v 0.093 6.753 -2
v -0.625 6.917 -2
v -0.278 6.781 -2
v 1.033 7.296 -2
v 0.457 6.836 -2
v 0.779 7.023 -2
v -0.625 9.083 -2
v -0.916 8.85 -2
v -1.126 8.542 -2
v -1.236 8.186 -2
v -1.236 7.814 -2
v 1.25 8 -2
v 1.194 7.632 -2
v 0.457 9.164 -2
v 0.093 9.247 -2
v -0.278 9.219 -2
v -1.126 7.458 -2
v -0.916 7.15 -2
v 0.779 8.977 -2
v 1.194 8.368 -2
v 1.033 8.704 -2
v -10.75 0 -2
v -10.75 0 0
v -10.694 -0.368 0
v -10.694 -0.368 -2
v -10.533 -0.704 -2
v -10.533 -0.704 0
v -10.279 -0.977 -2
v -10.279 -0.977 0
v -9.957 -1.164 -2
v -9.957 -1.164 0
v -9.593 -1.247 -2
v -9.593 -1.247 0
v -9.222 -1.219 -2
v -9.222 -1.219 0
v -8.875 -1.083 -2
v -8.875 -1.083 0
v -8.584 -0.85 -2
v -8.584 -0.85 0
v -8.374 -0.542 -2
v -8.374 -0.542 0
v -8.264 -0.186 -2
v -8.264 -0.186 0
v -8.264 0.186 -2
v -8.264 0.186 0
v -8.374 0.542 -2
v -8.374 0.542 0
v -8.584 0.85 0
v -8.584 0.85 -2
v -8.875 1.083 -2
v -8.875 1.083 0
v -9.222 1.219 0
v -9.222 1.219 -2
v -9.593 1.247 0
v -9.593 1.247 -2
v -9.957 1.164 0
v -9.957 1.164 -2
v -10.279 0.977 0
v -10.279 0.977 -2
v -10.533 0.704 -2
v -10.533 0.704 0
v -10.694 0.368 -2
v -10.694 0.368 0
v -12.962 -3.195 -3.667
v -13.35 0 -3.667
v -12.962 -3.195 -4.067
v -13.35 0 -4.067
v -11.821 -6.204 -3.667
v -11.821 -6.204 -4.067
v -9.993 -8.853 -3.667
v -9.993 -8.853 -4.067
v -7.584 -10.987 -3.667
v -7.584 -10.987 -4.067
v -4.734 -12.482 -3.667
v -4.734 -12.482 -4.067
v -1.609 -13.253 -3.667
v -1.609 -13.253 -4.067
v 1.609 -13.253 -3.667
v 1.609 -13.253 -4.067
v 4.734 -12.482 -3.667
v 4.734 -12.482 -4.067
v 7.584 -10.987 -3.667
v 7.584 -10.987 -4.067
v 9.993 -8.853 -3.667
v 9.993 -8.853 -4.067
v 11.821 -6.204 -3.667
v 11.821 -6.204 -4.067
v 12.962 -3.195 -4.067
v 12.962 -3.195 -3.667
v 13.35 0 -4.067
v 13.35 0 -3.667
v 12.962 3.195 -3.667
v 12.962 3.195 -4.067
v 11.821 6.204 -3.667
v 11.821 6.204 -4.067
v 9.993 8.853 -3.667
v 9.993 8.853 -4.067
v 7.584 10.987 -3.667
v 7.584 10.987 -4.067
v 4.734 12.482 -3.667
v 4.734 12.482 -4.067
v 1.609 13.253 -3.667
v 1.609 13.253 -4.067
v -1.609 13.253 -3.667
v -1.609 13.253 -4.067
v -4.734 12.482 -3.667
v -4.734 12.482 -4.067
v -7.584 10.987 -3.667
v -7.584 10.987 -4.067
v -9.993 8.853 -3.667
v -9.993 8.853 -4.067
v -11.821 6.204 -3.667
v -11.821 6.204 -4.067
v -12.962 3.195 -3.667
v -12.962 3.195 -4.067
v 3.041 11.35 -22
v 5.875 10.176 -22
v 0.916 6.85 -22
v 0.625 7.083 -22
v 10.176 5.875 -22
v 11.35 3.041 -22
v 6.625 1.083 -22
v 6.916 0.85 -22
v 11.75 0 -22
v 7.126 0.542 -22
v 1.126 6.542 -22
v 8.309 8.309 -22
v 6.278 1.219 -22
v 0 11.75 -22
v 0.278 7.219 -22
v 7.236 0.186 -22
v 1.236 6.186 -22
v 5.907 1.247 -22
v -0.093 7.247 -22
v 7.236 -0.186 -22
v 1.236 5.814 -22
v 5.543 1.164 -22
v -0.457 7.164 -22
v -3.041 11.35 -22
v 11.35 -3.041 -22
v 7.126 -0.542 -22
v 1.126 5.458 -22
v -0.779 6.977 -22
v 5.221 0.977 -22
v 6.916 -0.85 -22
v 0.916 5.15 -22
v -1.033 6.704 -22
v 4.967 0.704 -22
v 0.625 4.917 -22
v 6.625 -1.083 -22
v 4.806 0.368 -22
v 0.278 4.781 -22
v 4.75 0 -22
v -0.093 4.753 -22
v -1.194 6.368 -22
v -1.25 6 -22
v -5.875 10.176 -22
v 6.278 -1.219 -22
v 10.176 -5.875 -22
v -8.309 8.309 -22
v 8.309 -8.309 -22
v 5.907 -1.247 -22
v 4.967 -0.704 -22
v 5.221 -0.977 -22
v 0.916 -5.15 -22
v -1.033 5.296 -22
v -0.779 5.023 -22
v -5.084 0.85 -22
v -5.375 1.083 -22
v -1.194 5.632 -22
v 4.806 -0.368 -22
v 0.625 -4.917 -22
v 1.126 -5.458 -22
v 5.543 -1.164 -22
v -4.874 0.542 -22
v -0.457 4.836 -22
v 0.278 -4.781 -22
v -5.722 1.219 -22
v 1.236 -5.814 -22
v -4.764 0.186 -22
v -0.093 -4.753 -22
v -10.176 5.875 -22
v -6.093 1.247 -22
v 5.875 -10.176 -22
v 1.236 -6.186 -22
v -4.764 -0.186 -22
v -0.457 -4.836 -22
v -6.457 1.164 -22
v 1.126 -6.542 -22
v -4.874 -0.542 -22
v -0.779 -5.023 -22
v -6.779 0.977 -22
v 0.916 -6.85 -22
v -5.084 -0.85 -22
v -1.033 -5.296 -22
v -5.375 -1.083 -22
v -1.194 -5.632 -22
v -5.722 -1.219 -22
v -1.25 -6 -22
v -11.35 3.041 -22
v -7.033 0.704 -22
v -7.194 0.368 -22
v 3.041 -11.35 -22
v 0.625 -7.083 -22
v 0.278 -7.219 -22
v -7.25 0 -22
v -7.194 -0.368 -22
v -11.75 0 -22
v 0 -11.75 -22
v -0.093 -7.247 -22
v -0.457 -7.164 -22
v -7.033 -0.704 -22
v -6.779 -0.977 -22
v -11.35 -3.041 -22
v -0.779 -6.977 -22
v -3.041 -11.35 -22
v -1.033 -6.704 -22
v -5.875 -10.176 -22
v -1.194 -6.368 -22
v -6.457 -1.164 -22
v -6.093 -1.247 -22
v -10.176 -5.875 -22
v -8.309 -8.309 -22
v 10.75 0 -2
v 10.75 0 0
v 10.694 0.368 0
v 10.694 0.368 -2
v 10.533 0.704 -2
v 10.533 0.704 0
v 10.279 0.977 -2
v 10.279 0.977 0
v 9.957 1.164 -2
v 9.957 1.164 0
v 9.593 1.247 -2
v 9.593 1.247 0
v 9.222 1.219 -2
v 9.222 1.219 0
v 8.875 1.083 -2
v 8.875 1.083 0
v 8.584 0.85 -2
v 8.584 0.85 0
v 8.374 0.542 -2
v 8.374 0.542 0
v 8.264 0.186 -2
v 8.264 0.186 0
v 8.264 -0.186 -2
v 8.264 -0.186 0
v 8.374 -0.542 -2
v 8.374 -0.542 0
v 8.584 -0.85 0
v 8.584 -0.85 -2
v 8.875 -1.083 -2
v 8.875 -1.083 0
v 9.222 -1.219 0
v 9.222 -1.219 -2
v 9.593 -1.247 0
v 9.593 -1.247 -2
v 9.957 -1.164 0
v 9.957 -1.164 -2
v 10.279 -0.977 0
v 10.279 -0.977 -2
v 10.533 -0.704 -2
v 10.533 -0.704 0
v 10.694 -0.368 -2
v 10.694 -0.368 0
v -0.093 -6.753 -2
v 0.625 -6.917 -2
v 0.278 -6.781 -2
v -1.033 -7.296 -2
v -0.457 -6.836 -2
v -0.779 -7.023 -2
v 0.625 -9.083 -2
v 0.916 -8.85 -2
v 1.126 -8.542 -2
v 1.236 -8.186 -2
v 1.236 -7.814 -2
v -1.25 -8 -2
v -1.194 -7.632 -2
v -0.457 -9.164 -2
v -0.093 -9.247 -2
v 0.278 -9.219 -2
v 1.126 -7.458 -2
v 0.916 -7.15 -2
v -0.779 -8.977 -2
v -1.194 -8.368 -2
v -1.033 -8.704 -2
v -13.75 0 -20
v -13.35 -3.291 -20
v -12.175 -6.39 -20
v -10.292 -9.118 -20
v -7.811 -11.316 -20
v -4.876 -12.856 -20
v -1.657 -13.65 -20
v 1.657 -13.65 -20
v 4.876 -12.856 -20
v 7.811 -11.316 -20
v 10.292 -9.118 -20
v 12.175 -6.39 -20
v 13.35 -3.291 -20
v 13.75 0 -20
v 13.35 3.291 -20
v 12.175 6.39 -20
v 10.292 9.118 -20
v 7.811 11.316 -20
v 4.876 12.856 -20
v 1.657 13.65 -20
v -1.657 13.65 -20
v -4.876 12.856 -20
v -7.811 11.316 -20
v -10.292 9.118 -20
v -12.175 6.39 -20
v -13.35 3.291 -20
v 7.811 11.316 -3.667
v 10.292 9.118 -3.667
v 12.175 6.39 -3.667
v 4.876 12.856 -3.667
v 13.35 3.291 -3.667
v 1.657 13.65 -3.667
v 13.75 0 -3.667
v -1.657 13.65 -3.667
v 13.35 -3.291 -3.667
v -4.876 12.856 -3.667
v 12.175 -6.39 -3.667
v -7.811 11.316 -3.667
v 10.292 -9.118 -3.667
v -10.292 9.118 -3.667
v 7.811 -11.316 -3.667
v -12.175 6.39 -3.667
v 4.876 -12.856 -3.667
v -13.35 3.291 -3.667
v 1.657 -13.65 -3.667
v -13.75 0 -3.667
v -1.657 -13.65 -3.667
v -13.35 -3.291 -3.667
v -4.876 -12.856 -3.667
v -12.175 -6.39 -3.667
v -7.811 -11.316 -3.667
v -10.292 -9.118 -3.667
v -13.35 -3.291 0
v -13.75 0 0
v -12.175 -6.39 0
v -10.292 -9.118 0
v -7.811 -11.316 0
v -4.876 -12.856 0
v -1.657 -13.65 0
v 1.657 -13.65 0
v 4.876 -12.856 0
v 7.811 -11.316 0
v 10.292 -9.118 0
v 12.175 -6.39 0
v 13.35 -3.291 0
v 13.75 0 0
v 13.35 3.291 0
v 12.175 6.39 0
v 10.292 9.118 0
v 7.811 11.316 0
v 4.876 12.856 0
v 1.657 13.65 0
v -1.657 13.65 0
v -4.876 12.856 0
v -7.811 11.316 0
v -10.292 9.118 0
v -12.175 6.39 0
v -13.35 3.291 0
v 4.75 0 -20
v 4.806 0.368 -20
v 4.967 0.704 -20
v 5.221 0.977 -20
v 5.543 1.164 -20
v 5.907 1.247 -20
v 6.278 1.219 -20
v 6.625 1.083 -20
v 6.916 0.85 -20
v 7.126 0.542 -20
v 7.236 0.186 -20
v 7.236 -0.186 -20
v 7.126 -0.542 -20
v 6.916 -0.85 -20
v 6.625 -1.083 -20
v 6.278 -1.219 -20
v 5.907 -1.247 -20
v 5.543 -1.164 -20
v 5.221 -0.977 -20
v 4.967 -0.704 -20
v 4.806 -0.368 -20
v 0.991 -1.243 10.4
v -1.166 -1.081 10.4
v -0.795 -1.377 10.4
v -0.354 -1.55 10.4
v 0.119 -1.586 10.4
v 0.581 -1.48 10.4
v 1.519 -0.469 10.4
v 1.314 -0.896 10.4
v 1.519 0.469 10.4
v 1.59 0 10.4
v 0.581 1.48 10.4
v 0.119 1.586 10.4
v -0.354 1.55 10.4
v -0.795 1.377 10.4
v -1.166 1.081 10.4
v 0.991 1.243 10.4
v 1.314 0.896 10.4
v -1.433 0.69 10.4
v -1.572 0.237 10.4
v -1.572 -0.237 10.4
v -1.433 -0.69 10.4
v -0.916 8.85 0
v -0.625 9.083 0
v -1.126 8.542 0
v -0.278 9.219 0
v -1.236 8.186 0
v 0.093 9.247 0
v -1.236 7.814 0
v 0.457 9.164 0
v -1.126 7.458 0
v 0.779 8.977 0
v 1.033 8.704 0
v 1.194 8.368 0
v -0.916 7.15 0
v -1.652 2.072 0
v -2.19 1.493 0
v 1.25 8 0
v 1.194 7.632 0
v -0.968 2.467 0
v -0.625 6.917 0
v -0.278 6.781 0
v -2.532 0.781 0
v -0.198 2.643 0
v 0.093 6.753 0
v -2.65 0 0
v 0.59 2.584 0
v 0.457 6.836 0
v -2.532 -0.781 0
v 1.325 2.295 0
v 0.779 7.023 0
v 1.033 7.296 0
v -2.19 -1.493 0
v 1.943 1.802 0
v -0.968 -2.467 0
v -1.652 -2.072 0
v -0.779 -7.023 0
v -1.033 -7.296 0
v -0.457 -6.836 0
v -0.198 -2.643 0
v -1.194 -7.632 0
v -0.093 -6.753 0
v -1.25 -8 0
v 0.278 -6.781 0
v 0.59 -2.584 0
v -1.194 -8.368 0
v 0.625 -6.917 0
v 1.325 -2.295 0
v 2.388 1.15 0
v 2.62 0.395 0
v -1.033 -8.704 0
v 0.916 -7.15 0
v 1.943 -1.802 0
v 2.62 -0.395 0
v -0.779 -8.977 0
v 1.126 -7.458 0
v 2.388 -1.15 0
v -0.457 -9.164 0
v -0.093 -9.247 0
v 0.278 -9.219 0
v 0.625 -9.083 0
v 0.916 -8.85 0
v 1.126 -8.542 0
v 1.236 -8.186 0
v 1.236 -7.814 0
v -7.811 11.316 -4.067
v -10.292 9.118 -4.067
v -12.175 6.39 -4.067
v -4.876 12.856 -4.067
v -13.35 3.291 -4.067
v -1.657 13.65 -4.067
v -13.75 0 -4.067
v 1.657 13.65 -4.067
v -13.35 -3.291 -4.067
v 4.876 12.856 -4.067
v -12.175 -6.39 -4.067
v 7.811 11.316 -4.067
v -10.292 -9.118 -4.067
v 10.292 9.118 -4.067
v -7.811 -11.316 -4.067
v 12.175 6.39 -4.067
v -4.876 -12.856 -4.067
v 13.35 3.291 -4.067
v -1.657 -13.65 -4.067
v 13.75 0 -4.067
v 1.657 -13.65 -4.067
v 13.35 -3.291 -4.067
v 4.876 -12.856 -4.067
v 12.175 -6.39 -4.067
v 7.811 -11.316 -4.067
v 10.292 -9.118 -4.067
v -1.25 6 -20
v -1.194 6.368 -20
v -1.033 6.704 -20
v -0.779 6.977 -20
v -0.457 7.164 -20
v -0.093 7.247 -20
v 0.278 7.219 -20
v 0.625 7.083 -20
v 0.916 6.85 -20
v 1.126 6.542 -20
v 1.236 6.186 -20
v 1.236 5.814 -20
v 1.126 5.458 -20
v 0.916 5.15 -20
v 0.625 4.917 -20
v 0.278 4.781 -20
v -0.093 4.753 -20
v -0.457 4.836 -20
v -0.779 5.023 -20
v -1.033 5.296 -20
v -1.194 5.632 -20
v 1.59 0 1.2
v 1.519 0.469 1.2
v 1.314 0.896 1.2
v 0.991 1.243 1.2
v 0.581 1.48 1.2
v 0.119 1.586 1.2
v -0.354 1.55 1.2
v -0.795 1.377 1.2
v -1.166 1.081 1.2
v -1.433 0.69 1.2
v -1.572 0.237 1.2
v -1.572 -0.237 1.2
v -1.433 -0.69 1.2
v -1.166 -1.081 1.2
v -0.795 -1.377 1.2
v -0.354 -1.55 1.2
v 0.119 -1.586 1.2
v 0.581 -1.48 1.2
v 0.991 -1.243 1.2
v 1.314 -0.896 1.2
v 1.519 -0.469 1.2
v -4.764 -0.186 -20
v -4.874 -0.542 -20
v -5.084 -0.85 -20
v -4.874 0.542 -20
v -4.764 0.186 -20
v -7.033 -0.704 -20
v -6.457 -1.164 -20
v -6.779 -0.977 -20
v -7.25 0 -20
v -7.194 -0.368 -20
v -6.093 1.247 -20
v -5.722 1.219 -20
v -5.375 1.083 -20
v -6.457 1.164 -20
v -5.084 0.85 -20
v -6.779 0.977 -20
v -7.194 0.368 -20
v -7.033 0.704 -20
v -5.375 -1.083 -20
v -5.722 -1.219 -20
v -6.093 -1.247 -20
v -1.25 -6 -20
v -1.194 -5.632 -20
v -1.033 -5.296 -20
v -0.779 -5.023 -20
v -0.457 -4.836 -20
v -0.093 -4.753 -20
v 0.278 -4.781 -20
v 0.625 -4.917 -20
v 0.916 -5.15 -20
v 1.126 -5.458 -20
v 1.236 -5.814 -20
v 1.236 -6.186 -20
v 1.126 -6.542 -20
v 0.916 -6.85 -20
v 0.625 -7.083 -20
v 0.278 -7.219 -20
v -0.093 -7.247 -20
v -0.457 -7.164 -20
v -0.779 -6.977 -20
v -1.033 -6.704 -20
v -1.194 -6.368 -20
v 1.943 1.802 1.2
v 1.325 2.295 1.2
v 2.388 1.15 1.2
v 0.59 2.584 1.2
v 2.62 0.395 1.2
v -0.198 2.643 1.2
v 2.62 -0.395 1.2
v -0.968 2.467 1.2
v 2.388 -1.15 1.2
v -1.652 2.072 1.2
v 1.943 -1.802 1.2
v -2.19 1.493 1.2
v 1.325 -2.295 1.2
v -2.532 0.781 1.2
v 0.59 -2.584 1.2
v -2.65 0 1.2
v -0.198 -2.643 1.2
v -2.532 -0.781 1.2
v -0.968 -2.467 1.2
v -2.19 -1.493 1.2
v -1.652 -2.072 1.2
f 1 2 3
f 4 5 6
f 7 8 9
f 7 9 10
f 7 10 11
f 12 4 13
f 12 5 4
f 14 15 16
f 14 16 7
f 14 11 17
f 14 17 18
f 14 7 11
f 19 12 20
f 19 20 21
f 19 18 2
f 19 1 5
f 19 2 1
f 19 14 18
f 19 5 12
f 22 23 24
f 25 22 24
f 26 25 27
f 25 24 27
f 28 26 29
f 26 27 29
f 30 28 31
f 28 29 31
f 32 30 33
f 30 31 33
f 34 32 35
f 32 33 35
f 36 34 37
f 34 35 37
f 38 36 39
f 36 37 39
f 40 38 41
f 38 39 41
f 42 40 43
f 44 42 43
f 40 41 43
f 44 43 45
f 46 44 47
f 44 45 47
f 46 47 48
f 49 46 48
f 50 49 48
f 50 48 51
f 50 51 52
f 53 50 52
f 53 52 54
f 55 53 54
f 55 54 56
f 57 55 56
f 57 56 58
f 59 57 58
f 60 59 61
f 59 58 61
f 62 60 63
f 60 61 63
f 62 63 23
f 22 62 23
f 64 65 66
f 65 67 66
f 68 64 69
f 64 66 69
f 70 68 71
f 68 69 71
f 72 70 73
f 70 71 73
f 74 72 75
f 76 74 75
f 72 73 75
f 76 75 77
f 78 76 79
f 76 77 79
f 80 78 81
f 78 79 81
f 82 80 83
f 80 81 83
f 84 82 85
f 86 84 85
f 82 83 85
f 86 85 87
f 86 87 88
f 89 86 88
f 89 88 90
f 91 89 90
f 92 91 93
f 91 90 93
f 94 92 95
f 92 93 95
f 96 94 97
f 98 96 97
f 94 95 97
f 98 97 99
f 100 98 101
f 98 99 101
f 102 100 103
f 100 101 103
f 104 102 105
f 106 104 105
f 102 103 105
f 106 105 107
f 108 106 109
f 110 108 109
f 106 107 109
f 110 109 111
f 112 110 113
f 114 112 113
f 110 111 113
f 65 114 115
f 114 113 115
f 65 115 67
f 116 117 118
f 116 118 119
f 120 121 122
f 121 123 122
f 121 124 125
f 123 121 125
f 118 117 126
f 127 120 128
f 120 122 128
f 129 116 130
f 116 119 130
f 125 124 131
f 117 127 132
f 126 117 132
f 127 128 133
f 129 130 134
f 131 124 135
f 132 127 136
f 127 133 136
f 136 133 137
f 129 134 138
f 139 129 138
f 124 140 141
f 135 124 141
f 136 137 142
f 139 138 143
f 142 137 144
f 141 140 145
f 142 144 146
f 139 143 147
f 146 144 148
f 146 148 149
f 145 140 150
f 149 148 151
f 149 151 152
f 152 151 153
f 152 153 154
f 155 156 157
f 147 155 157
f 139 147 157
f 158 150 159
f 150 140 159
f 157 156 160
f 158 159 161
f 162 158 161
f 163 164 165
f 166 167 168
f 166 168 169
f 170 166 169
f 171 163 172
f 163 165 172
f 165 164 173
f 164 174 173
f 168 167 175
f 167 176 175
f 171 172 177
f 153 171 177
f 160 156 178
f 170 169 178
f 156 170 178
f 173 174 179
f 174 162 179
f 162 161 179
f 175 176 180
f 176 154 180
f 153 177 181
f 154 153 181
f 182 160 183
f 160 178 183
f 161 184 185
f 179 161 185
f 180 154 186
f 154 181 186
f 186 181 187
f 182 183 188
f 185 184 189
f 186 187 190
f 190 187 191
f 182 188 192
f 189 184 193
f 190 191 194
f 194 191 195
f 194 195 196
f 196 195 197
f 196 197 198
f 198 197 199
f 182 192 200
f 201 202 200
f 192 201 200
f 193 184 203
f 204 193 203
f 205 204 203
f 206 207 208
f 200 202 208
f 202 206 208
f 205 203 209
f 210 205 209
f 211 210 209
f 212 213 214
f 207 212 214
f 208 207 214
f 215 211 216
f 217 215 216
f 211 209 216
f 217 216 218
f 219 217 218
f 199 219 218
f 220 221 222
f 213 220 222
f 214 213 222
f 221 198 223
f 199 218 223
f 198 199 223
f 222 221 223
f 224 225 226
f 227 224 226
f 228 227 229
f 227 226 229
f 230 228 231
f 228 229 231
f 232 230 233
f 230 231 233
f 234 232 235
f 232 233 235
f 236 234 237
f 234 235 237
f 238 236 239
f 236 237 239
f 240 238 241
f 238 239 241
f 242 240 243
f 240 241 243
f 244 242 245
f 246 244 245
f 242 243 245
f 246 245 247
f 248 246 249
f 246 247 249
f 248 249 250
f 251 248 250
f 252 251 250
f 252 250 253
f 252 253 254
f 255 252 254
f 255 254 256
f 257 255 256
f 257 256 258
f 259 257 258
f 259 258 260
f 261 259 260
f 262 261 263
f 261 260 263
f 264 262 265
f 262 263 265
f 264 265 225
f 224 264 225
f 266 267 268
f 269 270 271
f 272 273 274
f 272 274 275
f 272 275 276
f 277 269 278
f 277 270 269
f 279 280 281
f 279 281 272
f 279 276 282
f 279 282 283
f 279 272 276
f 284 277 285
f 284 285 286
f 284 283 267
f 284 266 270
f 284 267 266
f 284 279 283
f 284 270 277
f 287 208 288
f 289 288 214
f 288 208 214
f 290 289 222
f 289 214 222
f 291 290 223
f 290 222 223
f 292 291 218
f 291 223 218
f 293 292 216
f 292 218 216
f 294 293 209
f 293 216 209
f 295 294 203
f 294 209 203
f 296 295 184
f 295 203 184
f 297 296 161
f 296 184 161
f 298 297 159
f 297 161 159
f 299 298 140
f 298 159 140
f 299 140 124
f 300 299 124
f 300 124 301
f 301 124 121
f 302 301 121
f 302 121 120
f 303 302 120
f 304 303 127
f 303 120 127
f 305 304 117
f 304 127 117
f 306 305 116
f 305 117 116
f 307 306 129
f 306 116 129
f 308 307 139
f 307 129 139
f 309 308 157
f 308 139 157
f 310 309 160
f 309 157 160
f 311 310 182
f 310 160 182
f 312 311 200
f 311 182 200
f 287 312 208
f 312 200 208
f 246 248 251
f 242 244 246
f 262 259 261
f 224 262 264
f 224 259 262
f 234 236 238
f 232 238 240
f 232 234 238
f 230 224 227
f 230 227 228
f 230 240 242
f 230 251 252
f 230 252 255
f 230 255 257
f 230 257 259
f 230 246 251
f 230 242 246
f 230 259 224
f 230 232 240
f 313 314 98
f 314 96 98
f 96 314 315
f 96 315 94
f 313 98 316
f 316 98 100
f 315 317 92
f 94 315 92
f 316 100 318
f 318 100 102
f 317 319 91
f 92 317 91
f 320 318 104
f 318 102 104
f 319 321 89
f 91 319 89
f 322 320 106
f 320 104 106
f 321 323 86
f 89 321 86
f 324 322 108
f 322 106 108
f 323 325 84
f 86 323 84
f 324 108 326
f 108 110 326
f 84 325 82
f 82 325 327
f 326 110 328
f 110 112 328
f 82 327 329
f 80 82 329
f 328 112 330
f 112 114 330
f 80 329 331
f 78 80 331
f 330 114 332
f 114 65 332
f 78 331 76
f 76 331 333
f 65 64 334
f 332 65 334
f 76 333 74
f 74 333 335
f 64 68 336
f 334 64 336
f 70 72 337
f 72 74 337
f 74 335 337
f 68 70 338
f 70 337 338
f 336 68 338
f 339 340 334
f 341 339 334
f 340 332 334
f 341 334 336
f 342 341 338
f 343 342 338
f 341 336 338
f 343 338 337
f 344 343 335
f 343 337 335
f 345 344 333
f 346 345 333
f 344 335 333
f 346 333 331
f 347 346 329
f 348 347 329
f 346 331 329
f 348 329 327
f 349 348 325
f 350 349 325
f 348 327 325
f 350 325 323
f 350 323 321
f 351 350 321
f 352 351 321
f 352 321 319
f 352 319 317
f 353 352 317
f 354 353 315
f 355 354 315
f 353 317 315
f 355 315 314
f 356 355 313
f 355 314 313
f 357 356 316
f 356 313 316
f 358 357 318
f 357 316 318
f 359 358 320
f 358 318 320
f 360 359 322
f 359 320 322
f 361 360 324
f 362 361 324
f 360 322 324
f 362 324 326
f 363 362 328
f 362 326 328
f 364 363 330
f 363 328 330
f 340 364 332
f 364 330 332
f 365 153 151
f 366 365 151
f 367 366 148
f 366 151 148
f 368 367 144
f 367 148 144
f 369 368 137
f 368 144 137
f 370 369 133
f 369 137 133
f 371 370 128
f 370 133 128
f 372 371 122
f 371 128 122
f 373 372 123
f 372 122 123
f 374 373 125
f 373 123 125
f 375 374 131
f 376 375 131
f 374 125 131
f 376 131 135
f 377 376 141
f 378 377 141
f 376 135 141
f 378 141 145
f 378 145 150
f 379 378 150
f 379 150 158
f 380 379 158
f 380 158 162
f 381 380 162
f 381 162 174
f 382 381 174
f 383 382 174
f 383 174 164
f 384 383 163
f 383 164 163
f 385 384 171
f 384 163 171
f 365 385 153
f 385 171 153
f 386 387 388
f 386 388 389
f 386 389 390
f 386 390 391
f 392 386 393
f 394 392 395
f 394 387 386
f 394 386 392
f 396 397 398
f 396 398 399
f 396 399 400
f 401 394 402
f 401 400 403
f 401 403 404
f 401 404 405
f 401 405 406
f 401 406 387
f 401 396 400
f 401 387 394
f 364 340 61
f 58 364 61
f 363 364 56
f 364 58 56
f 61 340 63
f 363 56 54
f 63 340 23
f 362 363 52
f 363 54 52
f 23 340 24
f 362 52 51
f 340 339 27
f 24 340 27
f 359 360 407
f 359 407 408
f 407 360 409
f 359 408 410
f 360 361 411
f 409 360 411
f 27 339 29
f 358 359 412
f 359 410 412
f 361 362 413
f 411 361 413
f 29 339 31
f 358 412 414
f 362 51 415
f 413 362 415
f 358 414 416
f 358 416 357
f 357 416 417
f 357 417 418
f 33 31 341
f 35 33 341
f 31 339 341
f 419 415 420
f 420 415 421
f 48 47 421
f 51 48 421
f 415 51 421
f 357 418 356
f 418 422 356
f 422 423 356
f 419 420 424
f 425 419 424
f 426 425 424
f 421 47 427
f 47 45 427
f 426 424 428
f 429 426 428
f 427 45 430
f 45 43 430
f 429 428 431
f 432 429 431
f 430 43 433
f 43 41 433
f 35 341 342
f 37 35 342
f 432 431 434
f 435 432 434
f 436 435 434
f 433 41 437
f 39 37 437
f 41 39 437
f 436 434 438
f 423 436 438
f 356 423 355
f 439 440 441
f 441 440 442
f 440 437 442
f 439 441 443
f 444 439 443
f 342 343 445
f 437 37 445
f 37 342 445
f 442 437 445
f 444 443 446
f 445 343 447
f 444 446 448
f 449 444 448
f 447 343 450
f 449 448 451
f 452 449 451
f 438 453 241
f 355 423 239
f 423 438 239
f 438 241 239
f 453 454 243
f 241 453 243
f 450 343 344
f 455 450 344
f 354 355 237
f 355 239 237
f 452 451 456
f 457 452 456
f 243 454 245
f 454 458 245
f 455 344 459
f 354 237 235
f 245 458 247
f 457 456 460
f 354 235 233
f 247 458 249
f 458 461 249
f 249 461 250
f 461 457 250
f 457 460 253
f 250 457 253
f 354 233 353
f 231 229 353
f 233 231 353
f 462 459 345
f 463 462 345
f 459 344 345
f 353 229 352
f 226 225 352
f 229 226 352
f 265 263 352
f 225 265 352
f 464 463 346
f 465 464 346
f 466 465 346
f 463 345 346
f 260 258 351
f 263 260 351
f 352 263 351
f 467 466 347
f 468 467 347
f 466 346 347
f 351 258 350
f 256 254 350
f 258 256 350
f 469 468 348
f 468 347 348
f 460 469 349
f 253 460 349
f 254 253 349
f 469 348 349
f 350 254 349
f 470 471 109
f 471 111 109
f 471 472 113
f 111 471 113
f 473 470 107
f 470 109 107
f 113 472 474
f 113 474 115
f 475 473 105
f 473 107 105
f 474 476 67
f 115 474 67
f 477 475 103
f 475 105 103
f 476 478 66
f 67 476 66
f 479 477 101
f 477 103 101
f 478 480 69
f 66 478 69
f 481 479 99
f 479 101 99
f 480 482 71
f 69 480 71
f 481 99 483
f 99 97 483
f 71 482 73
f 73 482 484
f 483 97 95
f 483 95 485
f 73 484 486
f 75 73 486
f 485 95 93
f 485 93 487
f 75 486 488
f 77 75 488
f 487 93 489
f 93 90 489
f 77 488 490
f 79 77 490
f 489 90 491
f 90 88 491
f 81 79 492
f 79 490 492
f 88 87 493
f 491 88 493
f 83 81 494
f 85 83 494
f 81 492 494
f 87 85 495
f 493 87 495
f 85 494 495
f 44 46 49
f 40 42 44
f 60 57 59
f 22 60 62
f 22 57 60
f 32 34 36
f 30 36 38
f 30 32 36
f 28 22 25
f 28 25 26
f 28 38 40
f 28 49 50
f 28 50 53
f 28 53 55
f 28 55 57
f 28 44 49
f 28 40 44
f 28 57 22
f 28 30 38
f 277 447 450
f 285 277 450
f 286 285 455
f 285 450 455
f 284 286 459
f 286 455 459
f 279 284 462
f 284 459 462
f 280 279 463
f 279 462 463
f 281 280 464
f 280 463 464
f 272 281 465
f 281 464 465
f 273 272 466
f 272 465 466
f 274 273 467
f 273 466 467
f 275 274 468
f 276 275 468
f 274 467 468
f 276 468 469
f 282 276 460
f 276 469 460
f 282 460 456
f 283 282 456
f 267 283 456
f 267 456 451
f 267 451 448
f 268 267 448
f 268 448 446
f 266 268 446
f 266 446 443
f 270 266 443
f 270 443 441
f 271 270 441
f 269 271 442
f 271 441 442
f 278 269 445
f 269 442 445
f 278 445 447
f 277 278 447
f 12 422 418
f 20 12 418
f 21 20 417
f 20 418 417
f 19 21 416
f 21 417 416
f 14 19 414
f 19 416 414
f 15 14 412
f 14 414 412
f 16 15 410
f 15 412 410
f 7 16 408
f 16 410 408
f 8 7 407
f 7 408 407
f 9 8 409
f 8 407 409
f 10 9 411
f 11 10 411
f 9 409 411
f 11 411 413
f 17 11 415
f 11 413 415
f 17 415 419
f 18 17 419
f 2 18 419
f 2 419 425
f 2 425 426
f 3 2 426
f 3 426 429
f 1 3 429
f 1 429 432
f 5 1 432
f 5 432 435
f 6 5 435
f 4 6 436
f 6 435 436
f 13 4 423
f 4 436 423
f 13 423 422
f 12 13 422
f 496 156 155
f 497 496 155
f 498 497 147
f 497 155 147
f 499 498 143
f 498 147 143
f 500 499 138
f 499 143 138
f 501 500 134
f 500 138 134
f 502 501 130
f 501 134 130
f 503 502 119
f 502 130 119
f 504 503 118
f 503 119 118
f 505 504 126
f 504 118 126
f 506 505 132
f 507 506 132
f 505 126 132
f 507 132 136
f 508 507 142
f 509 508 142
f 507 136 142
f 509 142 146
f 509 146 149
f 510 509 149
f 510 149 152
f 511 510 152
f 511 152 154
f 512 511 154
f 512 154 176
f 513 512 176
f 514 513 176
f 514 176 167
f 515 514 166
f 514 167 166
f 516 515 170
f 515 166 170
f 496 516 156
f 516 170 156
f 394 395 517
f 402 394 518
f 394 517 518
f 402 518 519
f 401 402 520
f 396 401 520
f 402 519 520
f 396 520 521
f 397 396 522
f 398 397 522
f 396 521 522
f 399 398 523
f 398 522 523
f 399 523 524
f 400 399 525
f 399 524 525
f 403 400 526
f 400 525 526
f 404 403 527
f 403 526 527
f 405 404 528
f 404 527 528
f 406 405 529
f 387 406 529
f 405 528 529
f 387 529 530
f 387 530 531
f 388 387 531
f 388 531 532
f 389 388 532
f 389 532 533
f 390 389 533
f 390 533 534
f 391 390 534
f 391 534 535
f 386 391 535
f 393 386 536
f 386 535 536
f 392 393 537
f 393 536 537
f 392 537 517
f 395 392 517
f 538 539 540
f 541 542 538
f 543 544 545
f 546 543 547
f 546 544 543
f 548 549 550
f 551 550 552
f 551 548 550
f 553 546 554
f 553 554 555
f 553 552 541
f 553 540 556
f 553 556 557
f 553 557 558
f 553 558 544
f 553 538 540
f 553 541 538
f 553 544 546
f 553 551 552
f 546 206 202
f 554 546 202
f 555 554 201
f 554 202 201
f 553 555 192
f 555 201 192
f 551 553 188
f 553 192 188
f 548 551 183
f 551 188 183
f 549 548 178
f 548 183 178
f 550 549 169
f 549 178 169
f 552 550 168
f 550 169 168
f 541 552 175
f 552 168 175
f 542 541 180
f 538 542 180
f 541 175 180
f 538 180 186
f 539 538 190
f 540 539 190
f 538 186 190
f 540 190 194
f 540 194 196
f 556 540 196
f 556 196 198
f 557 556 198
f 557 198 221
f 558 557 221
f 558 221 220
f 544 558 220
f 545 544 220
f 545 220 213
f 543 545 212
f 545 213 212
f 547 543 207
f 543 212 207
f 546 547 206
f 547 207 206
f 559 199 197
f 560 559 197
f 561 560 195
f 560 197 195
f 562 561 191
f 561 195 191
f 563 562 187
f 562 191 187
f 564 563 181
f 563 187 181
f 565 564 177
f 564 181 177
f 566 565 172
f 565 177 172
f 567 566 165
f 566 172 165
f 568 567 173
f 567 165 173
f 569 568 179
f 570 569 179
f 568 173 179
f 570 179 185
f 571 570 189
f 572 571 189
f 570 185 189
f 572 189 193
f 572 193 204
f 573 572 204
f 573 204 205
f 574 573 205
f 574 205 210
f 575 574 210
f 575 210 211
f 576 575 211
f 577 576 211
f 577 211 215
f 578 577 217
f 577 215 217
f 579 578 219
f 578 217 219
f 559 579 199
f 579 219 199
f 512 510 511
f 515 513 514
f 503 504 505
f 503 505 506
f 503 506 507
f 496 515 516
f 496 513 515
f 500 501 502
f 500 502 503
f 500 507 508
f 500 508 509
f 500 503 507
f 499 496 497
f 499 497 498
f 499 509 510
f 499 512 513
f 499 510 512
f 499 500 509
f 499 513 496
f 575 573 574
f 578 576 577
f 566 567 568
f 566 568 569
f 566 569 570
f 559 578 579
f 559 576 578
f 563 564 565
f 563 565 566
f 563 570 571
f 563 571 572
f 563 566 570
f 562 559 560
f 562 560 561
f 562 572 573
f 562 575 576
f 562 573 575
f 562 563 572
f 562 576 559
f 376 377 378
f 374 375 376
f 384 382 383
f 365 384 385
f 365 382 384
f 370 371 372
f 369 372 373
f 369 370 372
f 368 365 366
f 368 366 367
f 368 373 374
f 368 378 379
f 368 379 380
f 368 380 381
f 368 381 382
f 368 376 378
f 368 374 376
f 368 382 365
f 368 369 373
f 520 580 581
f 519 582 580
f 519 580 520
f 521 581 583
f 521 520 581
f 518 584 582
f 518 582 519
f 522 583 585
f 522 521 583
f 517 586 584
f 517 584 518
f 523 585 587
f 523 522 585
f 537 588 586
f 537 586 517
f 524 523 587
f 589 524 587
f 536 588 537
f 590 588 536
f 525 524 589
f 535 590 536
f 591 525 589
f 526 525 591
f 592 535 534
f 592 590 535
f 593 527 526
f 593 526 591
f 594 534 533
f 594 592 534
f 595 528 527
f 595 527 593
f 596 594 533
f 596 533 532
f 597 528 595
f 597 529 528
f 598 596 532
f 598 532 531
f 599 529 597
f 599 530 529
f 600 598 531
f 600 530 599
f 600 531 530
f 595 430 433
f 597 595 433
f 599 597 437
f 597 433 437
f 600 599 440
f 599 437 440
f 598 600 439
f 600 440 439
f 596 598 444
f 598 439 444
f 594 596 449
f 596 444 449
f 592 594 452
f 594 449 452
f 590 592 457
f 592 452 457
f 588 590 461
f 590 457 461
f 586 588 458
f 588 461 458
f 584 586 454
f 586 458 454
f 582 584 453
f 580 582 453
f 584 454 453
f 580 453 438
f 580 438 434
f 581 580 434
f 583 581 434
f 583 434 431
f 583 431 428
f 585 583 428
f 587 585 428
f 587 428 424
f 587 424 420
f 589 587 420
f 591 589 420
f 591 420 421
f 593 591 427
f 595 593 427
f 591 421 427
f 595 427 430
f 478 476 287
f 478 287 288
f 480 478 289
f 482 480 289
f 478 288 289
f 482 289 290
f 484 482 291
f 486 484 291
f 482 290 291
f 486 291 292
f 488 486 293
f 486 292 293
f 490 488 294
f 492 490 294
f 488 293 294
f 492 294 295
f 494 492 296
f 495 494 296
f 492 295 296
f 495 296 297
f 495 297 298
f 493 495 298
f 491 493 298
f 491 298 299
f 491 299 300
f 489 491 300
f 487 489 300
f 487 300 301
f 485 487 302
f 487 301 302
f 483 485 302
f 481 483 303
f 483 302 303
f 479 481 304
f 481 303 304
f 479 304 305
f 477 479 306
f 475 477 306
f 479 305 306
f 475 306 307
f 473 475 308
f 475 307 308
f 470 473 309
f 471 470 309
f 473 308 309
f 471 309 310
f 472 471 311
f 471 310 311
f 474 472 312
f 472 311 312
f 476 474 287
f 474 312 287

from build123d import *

# Parameters (mm, degrees)
SKETCH2_R           = 1.25
CUT_EXTRUDE1_DEPTH  = 2
SKETCH3_R           = 1.25
CUT_EXTRUDE2_DEPTH  = 2
SKETCH4_R           = 2.65
BOSS_EXTRUDE1_DEPTH = 1.2
SKETCH5_R           = 1.59
BOSS_EXTRUDE2_DEPTH = 9.2
CHAMFER1_SIZE       = 2


with BuildPart() as part:
    # Sketch1 → Revolve1 (revolve)
    with BuildSketch(Plane(origin=(0, 0, 0), x_dir=(1, 0, 0), z_dir=(0, 1, 0)), mode=Mode.PRIVATE) as revolve1_sk:
        Polygon((13.75, 0), (13.75, 3.666666667), (13.35, 3.666666667), (13.35, 4.066666667), (13.75, 4.066666667), (13.75, 22), (0, 22), (0, 0), align=None)
    revolve(revolve1_sk.sketch.rotate(Axis((0, 0, -22), (0, 0, 1)), 180), axis=Axis((0, 0, -22), (0, 0, 1)))

    # Sketch2 → Cut-Extrude1 (cut)
    with BuildSketch(Plane.XY):
        with Locations((9.5, 0)):
            Circle(SKETCH2_R)
        with Locations((0, 8)):
            Circle(SKETCH2_R)
        with Locations(Location((0, -8, 0), (0, 0, 180))):
            Circle(SKETCH2_R)
        with Locations(Location((-9.5, 0, 0), (0, 0, 180))):
            Circle(SKETCH2_R)
    extrude(amount=-CUT_EXTRUDE1_DEPTH, mode=Mode.SUBTRACT)

    # Sketch3 → Cut-Extrude2 (cut)
    with BuildSketch(Plane(origin=(0, 0, -22), x_dir=(-1, 0, 0), z_dir=(0, 0, -1))):
        with Locations((6, 0)):
            Circle(SKETCH3_R)
        with Locations((0, -6)):
            Circle(SKETCH3_R)
        with Locations((-6, 0)):
            Circle(SKETCH3_R)
        with Locations((0, 6)):
            Circle(SKETCH3_R)
    extrude(amount=-CUT_EXTRUDE2_DEPTH, mode=Mode.SUBTRACT)

    # Sketch4 → Boss-Extrude1 (add)
    with BuildSketch(Plane.XY):
        with Locations(Location((0, 0, 0), (0, 0, 180))):
            Circle(SKETCH4_R)
    extrude(amount=BOSS_EXTRUDE1_DEPTH)

    # Sketch5 → Boss-Extrude2 (add)
    with BuildSketch(Plane.XY.offset(1.2)):
        Circle(SKETCH5_R)
    extrude(amount=BOSS_EXTRUDE2_DEPTH)

    # Chamfer1
    chamfer1_edges = [part.edges().sort_by_distance(p)[0] for p in [
        (13.75, 0, -22),
    ]]
    chamfer(chamfer1_edges, length=CHAMFER1_SIZE)


solid = part.part
